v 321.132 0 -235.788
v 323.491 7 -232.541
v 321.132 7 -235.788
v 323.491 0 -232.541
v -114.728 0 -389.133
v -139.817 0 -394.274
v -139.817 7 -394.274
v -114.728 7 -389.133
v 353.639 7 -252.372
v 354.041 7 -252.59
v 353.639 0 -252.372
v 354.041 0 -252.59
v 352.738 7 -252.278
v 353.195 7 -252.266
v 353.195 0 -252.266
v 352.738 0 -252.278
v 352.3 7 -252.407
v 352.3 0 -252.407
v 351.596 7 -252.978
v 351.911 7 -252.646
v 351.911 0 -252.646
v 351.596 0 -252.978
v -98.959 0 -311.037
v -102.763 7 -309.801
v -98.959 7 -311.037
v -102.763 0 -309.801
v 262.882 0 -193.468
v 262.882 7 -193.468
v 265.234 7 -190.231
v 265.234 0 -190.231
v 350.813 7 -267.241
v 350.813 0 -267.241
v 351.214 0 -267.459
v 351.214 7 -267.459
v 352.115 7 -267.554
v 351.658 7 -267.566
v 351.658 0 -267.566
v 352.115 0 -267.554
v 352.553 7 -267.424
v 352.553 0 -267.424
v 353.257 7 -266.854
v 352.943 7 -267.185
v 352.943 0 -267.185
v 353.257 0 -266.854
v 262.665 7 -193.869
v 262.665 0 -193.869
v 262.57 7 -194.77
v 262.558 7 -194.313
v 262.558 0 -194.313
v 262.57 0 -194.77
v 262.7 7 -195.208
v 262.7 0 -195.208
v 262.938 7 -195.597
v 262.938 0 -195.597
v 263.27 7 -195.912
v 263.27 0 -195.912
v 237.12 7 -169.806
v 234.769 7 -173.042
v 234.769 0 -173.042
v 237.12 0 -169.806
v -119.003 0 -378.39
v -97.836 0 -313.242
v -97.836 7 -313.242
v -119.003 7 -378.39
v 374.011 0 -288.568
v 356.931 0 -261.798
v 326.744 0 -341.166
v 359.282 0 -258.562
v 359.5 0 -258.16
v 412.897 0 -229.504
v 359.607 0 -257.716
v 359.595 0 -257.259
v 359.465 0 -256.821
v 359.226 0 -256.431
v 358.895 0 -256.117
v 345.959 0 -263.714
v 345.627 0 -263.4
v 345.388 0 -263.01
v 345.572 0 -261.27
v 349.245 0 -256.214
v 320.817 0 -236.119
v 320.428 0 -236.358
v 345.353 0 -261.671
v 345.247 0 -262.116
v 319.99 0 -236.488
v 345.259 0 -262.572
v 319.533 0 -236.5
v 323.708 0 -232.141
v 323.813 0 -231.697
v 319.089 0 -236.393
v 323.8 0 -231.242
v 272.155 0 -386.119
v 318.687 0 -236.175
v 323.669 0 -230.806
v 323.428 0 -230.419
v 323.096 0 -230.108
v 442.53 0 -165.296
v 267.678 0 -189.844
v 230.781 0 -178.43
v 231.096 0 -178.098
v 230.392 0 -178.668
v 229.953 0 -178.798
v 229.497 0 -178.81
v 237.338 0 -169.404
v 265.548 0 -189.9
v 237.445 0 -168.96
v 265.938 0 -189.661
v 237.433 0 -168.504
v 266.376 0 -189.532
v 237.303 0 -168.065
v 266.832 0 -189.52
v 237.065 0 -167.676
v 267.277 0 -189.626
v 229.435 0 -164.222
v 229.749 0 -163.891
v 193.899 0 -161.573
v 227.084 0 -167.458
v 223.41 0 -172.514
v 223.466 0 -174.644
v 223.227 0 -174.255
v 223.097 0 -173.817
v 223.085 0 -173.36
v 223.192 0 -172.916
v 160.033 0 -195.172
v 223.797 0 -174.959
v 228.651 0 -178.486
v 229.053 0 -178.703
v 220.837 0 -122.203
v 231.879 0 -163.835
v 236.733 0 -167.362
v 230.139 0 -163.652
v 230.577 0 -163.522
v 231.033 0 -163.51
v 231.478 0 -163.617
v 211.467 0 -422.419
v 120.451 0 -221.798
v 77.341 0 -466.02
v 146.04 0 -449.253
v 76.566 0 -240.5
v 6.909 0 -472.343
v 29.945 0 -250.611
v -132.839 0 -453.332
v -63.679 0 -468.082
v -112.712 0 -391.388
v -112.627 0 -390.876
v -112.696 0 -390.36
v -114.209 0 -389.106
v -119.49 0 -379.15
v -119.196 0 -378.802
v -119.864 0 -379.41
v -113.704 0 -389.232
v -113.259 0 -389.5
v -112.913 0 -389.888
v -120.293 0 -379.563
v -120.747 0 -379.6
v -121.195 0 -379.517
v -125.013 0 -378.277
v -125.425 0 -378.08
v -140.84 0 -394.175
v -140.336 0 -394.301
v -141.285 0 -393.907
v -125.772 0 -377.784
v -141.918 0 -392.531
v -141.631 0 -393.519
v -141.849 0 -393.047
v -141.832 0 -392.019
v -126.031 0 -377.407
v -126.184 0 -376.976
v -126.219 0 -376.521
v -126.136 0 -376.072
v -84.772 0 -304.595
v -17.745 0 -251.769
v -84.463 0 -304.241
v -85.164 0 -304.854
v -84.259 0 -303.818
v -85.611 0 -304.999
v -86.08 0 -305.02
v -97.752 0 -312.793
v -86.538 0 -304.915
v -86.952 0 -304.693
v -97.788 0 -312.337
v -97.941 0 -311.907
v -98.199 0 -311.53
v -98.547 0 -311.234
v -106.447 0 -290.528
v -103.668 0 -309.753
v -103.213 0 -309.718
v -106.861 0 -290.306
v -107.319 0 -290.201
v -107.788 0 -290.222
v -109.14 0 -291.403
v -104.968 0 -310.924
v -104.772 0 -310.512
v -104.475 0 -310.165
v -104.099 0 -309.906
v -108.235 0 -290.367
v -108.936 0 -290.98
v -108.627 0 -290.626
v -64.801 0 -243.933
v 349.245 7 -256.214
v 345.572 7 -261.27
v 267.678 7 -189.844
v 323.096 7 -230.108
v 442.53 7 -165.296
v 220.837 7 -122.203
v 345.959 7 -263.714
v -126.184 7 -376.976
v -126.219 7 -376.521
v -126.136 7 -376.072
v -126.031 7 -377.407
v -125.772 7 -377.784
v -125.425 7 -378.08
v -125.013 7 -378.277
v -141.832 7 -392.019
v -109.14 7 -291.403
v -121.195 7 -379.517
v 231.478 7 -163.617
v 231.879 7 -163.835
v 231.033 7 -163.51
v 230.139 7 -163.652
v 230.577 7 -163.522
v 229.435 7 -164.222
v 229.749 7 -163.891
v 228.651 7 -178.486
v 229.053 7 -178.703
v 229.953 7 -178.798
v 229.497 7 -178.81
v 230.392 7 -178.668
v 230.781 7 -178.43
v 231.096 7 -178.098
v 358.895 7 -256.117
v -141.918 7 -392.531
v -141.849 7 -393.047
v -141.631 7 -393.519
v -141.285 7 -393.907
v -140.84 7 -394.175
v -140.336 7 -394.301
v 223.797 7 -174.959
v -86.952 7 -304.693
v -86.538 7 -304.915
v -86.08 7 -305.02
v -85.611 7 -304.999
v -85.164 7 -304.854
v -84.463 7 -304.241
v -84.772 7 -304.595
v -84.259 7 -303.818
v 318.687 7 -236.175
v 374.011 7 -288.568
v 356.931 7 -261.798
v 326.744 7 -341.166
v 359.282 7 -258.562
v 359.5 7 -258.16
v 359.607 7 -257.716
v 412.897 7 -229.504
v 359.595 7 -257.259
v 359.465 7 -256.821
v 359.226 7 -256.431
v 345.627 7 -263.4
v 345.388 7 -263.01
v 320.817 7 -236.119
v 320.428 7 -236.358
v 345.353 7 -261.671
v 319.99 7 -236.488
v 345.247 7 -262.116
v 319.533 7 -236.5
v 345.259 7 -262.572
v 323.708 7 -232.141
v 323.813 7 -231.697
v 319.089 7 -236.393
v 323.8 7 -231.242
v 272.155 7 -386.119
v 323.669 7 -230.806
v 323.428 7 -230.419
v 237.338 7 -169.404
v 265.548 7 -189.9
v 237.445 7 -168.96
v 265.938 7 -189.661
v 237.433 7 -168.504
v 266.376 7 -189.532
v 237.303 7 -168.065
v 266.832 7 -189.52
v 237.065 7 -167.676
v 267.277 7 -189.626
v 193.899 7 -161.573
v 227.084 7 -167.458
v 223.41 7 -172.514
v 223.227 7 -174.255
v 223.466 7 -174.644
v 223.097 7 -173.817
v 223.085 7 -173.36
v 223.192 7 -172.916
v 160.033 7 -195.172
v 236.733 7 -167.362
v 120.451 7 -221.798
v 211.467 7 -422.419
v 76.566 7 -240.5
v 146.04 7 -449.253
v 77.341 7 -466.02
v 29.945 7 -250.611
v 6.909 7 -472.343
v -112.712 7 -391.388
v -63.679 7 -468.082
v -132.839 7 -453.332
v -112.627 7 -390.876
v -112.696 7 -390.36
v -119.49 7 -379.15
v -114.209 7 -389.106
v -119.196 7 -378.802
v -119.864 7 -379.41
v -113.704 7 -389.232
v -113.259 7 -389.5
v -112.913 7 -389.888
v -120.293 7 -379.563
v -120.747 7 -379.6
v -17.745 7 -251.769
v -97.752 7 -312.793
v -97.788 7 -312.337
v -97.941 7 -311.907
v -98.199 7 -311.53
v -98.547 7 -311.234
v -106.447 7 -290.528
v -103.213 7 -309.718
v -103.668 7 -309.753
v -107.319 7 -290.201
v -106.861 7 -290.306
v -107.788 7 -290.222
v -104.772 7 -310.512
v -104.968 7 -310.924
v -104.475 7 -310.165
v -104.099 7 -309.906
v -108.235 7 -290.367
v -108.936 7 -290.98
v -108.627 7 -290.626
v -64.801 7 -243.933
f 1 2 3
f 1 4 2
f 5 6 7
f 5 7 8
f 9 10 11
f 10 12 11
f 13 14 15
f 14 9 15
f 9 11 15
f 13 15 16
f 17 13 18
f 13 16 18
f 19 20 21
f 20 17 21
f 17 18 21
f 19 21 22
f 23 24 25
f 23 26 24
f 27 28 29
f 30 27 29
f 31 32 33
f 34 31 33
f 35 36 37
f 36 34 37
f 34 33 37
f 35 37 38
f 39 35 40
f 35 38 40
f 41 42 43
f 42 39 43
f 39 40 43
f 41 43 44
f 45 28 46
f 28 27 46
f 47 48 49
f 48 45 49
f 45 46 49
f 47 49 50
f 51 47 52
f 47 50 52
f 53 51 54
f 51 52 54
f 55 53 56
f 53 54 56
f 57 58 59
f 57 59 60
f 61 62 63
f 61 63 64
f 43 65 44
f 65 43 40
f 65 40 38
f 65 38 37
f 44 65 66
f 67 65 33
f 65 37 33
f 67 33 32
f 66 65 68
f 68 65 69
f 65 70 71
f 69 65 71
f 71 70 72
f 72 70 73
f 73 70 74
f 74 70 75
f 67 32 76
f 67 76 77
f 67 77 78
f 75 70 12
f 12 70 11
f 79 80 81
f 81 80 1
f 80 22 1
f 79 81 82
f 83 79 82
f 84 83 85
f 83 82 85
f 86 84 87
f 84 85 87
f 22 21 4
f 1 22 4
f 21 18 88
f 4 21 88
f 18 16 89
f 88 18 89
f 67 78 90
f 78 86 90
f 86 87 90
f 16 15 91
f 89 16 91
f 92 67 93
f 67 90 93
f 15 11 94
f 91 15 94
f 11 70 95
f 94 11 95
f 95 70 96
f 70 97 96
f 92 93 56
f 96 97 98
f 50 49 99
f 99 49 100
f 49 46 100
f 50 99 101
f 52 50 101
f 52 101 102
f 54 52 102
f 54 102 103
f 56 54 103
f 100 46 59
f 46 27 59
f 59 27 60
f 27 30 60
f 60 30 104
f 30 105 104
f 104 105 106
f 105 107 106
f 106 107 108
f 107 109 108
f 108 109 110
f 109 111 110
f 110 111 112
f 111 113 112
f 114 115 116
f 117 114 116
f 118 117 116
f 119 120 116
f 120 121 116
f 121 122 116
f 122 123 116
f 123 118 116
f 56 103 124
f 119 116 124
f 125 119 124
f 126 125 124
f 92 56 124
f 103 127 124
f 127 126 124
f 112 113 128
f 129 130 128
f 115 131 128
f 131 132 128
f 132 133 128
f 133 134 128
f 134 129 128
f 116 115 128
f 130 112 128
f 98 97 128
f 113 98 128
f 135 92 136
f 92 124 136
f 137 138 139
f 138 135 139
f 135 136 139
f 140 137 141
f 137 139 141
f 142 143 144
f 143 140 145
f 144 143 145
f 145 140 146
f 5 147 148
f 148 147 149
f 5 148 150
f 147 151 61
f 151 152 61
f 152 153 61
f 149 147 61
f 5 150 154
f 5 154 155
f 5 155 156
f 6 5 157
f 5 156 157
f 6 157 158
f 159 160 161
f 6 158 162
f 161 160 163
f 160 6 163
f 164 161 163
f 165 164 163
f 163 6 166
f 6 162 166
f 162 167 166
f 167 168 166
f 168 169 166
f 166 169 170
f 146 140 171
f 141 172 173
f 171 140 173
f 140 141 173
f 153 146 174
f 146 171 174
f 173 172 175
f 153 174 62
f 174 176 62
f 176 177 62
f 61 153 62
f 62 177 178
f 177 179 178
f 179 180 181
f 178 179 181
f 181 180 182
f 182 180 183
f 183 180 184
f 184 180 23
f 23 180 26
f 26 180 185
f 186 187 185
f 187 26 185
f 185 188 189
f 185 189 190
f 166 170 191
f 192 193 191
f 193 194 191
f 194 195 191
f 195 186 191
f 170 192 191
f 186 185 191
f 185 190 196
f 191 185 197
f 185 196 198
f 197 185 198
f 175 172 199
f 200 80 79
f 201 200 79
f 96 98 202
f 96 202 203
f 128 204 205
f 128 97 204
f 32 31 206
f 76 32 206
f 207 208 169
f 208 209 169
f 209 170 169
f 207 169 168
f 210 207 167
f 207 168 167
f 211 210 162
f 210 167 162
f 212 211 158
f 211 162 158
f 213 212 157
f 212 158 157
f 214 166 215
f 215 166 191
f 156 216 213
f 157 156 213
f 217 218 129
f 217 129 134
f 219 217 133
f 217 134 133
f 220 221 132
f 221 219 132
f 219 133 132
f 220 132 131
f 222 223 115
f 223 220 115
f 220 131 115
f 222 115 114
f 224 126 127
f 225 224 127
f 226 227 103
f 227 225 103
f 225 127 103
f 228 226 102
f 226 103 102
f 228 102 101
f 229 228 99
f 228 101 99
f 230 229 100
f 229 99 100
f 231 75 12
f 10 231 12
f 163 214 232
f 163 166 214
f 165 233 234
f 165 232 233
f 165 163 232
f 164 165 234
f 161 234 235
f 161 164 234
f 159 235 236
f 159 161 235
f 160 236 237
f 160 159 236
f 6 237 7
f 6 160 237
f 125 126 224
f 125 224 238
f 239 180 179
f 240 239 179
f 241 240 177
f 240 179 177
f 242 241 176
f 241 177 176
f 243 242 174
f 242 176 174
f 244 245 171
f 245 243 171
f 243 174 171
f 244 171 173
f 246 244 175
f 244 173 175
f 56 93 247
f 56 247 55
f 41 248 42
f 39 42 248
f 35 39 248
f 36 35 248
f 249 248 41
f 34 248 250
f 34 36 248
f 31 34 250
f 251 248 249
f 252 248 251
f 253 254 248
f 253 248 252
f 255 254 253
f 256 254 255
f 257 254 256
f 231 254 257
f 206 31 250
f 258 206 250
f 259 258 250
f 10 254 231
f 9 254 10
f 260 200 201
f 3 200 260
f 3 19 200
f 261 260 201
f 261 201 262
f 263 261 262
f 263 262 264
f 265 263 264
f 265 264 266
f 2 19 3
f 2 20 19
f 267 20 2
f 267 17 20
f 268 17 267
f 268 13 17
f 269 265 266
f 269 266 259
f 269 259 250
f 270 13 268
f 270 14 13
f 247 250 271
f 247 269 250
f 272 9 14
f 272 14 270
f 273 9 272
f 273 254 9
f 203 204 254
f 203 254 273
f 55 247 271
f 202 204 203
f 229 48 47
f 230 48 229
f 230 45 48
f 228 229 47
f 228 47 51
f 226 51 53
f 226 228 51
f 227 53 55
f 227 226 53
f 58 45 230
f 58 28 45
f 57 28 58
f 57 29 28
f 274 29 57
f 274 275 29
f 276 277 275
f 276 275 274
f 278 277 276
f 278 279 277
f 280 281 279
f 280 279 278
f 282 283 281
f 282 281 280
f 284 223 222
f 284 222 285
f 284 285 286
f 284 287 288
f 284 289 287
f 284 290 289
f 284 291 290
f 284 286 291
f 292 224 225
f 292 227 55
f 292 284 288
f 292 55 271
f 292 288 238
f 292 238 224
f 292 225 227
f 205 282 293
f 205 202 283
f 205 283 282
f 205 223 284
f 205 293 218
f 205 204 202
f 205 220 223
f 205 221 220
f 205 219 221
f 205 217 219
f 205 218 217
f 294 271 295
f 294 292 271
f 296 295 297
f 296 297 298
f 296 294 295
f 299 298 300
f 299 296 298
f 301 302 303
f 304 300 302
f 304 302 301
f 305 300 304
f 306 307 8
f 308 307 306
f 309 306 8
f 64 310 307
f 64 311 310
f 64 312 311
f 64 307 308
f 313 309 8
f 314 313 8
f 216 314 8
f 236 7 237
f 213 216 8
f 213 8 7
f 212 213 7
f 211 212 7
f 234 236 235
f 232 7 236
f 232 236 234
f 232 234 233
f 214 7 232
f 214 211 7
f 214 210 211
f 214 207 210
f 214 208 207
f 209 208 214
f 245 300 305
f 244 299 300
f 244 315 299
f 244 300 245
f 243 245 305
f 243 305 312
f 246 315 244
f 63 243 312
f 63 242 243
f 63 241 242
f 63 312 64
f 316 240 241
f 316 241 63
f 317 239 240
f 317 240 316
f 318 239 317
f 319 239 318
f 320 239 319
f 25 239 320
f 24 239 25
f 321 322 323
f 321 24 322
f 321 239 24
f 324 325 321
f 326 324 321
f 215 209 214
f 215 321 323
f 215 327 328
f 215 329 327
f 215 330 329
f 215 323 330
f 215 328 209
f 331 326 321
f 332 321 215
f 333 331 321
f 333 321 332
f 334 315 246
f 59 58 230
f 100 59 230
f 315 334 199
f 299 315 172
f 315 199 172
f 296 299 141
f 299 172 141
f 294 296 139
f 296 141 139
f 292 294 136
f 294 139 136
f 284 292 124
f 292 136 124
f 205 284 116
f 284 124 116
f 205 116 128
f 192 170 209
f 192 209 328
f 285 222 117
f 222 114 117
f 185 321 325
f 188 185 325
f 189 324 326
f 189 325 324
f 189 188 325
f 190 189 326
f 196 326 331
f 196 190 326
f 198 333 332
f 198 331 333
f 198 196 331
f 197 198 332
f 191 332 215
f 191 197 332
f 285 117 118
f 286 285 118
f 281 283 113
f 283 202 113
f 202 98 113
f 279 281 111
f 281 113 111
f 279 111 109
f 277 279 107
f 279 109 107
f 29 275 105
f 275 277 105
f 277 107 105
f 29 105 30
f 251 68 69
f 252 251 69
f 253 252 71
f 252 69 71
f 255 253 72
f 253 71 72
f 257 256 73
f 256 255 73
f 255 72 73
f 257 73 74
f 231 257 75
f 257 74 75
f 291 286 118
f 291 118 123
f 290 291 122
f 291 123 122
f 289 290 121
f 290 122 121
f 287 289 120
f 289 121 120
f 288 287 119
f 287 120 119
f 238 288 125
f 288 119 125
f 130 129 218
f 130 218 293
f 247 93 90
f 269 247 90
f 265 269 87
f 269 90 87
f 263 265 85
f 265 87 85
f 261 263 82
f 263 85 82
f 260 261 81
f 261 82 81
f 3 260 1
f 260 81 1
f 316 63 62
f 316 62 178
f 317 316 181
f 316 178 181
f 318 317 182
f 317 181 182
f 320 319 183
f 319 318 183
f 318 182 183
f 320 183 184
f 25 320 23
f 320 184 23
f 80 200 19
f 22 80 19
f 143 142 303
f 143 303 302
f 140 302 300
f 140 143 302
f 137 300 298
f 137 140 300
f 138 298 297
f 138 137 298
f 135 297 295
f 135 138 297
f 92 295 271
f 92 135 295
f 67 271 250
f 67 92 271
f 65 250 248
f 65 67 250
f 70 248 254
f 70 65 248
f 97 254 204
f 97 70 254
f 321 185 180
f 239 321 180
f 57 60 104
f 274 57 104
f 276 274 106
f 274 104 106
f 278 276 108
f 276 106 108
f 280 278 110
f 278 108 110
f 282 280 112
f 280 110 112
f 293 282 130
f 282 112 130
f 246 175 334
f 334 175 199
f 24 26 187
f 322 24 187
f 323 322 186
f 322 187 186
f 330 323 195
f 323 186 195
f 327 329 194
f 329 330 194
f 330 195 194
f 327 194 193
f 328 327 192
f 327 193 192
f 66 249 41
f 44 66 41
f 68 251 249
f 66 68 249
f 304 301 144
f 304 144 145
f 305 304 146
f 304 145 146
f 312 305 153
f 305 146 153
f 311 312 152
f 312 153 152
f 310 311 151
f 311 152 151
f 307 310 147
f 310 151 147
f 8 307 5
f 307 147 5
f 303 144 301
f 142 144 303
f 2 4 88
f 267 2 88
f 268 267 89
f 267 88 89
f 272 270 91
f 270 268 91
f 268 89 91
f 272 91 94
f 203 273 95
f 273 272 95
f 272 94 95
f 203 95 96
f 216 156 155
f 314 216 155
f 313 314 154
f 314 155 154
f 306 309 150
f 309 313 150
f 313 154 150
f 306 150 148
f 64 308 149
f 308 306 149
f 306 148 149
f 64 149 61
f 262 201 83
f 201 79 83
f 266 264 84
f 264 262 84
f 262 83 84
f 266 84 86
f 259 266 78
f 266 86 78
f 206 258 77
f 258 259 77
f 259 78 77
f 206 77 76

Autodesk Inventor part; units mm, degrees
ref_plane "YZ Plane" through (0, 0, 0) normal (1, 0, 0) x (0, 1, 0)
ref_plane "XZ Plane" through (0, 0, 0) normal (0, 1, 0) x (-1, 0, 0)
ref_plane "XY Plane" through (0, 0, 0) normal (0, 0, 1) x (1, 0, 0)
sketch "Sketch1" plane through (0, 0, 0) normal (0, 1, 0) x (-1, 0, 0)
  line L0 (0, 0) -> (618.9442, 0)
  line L1 (0, 0) -> (191.2643, 588.6509)
  line L2 (0, 0) -> (-500.7364, 363.8063)
  line L3 (0, 0) -> (-500.7364, -363.8063)
  line L4 (0, 0) -> (191.2643, -588.6509)
  line L5 (396.6438, 3.75) -> (328.1438, 3.75)
  line L6 (328.1438, -3.75) -> (396.6438, -3.75)
  arc A0 (472.3938, 0) -> (145.9777, 449.2732) centre (0, 0) ccw
  arc A1 (77.994, -240.0408) -> (252.3938, 0) centre (0, 0) ccw
  line L7 (289.8938, 3.75) -> (283.8938, 3.75)
  line L8 (283.8938, -3.75) -> (289.8938, -3.75)
  arc A2 (328.1438, 3.75) -> (326.3938, 2) centre (328.1438, 2) ccw
  arc A3 (326.3938, -2) -> (328.1438, -3.75) centre (328.1438, -2) ccw
  line L9 (326.3938, 2) -> (326.3938, -2)
  arc A4 (398.3938, 2) -> (396.6438, 3.75) centre (396.6438, 2) ccw
  arc A5 (396.6438, -3.75) -> (398.3938, -2.0136) centre (396.6573, -2.0136) ccw
  line L10 (398.3938, -2.0136) -> (398.3938, 2)
  line L11 (362.3938, -3.75) -> (362.3938, 32.9806)
  arc A6 (283.8938, 3.75) -> (282.1438, 2) centre (283.8938, 2) ccw
  arc A7 (282.1438, -2) -> (283.8938, -3.75) centre (283.8938, -2) ccw
  arc A8 (289.8938, -3.75) -> (291.6438, -2) centre (289.8938, -2) ccw
  arc A9 (291.6438, 2) -> (289.8938, 3.75) centre (289.8938, 2) ccw
  line L12 (291.6438, 2) -> (291.6438, -2)
  line L13 (282.1438, -2) -> (282.1438, 2)
  line L14 (434.8938, 3.75) -> (440.8938, 3.75)
  line L15 (440.8938, -3.75) -> (434.8938, -3.75)
  arc A10 (442.6438, 2) -> (440.8938, 3.75) centre (440.8938, 2) ccw
  arc A11 (440.8938, -3.75) -> (442.6438, -2) centre (440.8938, -2) ccw
  arc A12 (433.1438, -2) -> (434.8938, -3.75) centre (434.8938, -2) ccw
  arc A13 (434.8938, 3.75) -> (433.1438, 2) centre (434.8938, 2) ccw
  line L16 (433.1438, 2) -> (433.1438, -2)
  line L17 (442.6438, -2) -> (442.6438, 2)
  line L18 (131.9467, 412.5623) -> (135.7509, 411.3262)
  arc A14 (130.8231, 414.7674) -> (131.9467, 412.5623) centre (132.4875, 414.2266) ccw
  arc A15 (135.7509, 411.3262) -> (137.956, 412.4498) centre (136.2917, 412.9905) ccw
  line L19 (139.8101, 418.1561) -> (137.956, 412.4498)
  line L20 (130.8231, 414.7674) -> (132.6772, 420.4737)
  arc A16 (134.8823, 421.5973) -> (132.6772, 420.4737) centre (134.3416, 419.9329) ccw
  line L21 (138.6866, 420.3612) -> (134.8823, 421.5973)
  arc A17 (139.8101, 418.1561) -> (138.6866, 420.3612) centre (138.1458, 418.6969) ccw
  line L22 (125.0255, 378.2728) -> (121.2083, 379.513)
  arc A18 (121.2083, 379.513) -> (119.0032, 378.3895) centre (120.6676, 377.8487) ccw
  arc A19 (126.1361, 376.0718) -> (125.0255, 378.2728) centre (124.4888, 376.6213) ccw
  line L23 (119.0032, 378.3895) -> (97.8355, 313.2421)
  line L24 (98.9591, 311.037) -> (102.7633, 309.8009)
  arc A20 (97.8355, 313.2421) -> (98.9591, 311.037) centre (99.4999, 312.7013) ccw
  arc A21 (102.7633, 309.8009) -> (104.9685, 310.9245) centre (103.3041, 311.4652) ccw
  line L25 (104.9685, 310.9245) -> (126.1361, 376.0718)
  line L26 (88.2208, 277.9878) -> (92.025, 276.7517)
  arc A22 (93.1486, 274.5466) -> (92.025, 276.7517) centre (91.4842, 275.0873) ccw
  line L27 (91.2945, 268.8402) -> (93.1486, 274.5466)
  arc A23 (88.2208, 277.9878) -> (86.0156, 276.8642) centre (87.68, 276.3234) ccw
  line L28 (86.0156, 276.8642) -> (84.1615, 271.1578)
  arc A24 (84.1615, 271.1578) -> (85.2851, 268.9527) centre (85.8259, 270.6171) ccw
  arc A25 (89.0893, 267.7166) -> (91.2945, 268.8402) centre (89.6301, 269.381) ccw
  line L29 (89.0893, 267.7166) -> (85.2851, 268.9527)
  line L30 (-351.5963, 252.9775) -> (-349.2451, 256.2136)
  arc A26 (-354.0407, 252.5903) -> (-351.5963, 252.9775) centre (-353.012, 254.0061) ccw
  arc A27 (-349.2451, 256.2136) -> (-349.6323, 258.658) centre (-350.6609, 257.2422) ccw
  line L31 (-354.4864, 262.1847) -> (-349.6323, 258.658)
  line L32 (-354.0407, 252.5903) -> (-358.8948, 256.1171)
  arc A28 (-359.2819, 258.5615) -> (-358.8948, 256.1171) centre (-357.8661, 257.5328) ccw
  line L33 (-356.9308, 261.7975) -> (-359.2819, 258.5615)
  arc A29 (-354.4864, 262.1847) -> (-356.9308, 261.7975) centre (-355.515, 260.7689) ccw
  line L34 (-321.1238, 235.799) -> (-323.4829, 232.552)
  arc A30 (-323.4829, 232.552) -> (-323.0958, 230.1076) centre (-322.0671, 231.5233) ccw
  arc A31 (-318.6874, 236.1752) -> (-321.1238, 235.799) centre (-319.7189, 234.7783) ccw
  line L35 (-323.0958, 230.1076) -> (-267.6781, 189.8443)
  line L36 (-265.2337, 190.2314) -> (-262.8825, 193.4675)
  arc A32 (-267.6781, 189.8443) -> (-265.2337, 190.2314) centre (-266.6495, 191.26) ccw
  arc A33 (-262.8825, 193.4675) -> (-263.2697, 195.9119) centre (-264.2983, 194.4961) ccw
  line L37 (-263.2697, 195.9119) -> (-318.6874, 236.1752)
  line L38 (-237.1203, 169.8059) -> (-234.7692, 173.0419)
  arc A34 (-232.3248, 173.4291) -> (-234.7692, 173.0419) centre (-233.3534, 172.0133) ccw
  line L39 (-227.4707, 169.9024) -> (-232.3248, 173.4291)
  arc A35 (-237.1203, 169.8059) -> (-236.7332, 167.3615) centre (-235.7046, 168.7773) ccw
  line L40 (-236.7332, 167.3615) -> (-231.8791, 163.8348)
  arc A36 (-231.8791, 163.8348) -> (-229.4347, 164.2219) centre (-230.8505, 165.2505) ccw
  arc A37 (-227.0835, 167.458) -> (-227.4707, 169.9024) centre (-228.4993, 168.4866) ccw
  line L41 (-227.0835, 167.458) -> (-229.4347, 164.2219)
  line L42 (-349.2451, -256.2136) -> (-351.5963, -252.9775)
  arc A38 (-349.6323, -258.658) -> (-349.2451, -256.2136) centre (-350.6609, -257.2422) ccw
  arc A39 (-351.5963, -252.9775) -> (-354.0407, -252.5903) centre (-353.012, -254.0061) ccw
  line L43 (-358.8948, -256.117) -> (-354.0407, -252.5903)
  line L44 (-349.6323, -258.658) -> (-354.4864, -262.1847)
  arc A40 (-356.9308, -261.7975) -> (-354.4864, -262.1847) centre (-355.515, -260.7689) ccw
  line L45 (-359.2819, -258.5615) -> (-356.9308, -261.7975)
  arc A41 (-358.8948, -256.117) -> (-359.2819, -258.5615) centre (-357.8661, -257.5328) ccw
  line L46 (-323.4909, -232.541) -> (-321.1318, -235.788)
  arc A42 (-321.1318, -235.788) -> (-318.6874, -236.1752) centre (-319.716, -234.7594) ccw
  arc A43 (-323.0958, -230.1076) -> (-323.4909, -232.541) centre (-322.086, -231.5203) ccw
  line L47 (-318.6874, -236.1752) -> (-263.2697, -195.9119)
  line L48 (-262.8825, -193.4675) -> (-265.2337, -190.2314)
  arc A44 (-263.2697, -195.9119) -> (-262.8825, -193.4675) centre (-264.2983, -194.4961) ccw
  arc A45 (-265.2337, -190.2314) -> (-267.6781, -189.8443) centre (-266.6495, -191.26) ccw
  line L49 (-267.6781, -189.8443) -> (-323.0958, -230.1076)
  line L50 (-234.7692, -173.0419) -> (-237.1203, -169.8059)
  arc A46 (-236.7332, -167.3615) -> (-237.1203, -169.8059) centre (-235.7046, -168.7773) ccw
  line L51 (-231.8791, -163.8348) -> (-236.7332, -167.3615)
  arc A47 (-234.7692, -173.0419) -> (-232.3248, -173.4291) centre (-233.3534, -172.0133) ccw
  line L52 (-232.3248, -173.4291) -> (-227.4707, -169.9024)
  arc A48 (-227.4707, -169.9024) -> (-227.0835, -167.458) centre (-228.4993, -168.4866) ccw
  arc A49 (-229.4347, -164.2219) -> (-231.8791, -163.8348) centre (-230.8505, -165.2505) ccw
  line L53 (-229.4347, -164.2219) -> (-227.0835, -167.458)
  line L54 (135.7509, -411.3262) -> (131.9467, -412.5623)
  arc A50 (137.956, -412.4498) -> (135.7509, -411.3262) centre (136.2917, -412.9905) ccw
  arc A51 (131.9467, -412.5623) -> (130.8231, -414.7674) centre (132.4875, -414.2266) ccw
  line L55 (132.6772, -420.4737) -> (130.8231, -414.7674)
  line L56 (137.956, -412.4498) -> (139.8101, -418.1561)
  arc A52 (138.6866, -420.3612) -> (139.8101, -418.1561) centre (138.1458, -418.6969) ccw
  line L57 (134.8823, -421.5973) -> (138.6866, -420.3612)
  arc A53 (132.6772, -420.4737) -> (134.8823, -421.5973) centre (134.3416, -419.9329) ccw
  line L58 (121.1954, -379.5172) -> (125.0126, -378.277)
  arc A54 (125.0126, -378.277) -> (126.1361, -376.0718) centre (124.4718, -376.6126) ccw
  arc A55 (119.0032, -378.3895) -> (121.1954, -379.5172) centre (120.6588, -377.8657) ccw
  line L59 (126.1361, -376.0718) -> (104.9685, -310.9245)
  line L60 (102.7633, -309.8009) -> (98.9591, -311.037)
  arc A56 (104.9685, -310.9245) -> (102.7633, -309.8009) centre (103.3041, -311.4652) ccw
  arc A57 (98.9591, -311.037) -> (97.8355, -313.2421) centre (99.4999, -312.7013) ccw
  line L61 (97.8355, -313.2421) -> (119.0032, -378.3895)
  line L62 (92.025, -276.7517) -> (88.2208, -277.9878)
  arc A58 (86.0156, -276.8642) -> (88.2208, -277.9878) centre (87.68, -276.3234) ccw
  line L63 (84.1615, -271.1578) -> (86.0156, -276.8642)
  arc A59 (92.025, -276.7517) -> (93.1486, -274.5466) centre (91.4842, -275.0873) ccw
  line L64 (93.1486, -274.5466) -> (91.2945, -268.8402)
  arc A60 (91.2945, -268.8402) -> (89.0893, -267.7166) centre (89.6301, -269.381) ccw
  arc A61 (85.2851, -268.9527) -> (84.1615, -271.1578) centre (85.8259, -270.6171) ccw
  line L65 (85.2851, -268.9527) -> (89.0893, -267.7166)
  line L66 (-442.5303, 165.2961) -> (-220.837, 122.2033)
  line L67 (-442.5303, -165.2961) -> (-220.837, -122.2033)
  arc A62 (252.3938, 0) -> (-220.837, 122.2033) centre (0, 0) ccw
  arc A63 (-220.837, -122.2033) -> (77.994, -240.0408) centre (0, 0) ccw
  arc A64 (145.9777, 449.2732) -> (-442.5303, 165.2961) centre (0, 0) ccw
  arc A65 (-442.5303, -165.2961) -> (472.3938, 0) centre (0, 0) ccw
  line L68 (115.6782, 400.5167) -> (82.9862, 299.9012)
  line L69 (84.6505, 297.6104) -> (108.7484, 297.6104)
  line L70 (110.4128, 295.3196) -> (90.9552, 235.4353)
  line L71 (138.8662, 382.8904) -> (158.9929, 444.8338)
  line L72 (118.6344, 401.1564) -> (135.91, 382.2507)
  line L73 (123.1169, 378.8929) -> (127.2722, 391.7035) construction
  line L74 (100.8612, 310.4189) -> (96.6995, 297.6104) construction
  arc A66 (135.91, 382.2507) -> (138.8662, 382.8904) centre (137.2019, 383.4311) ccw
  arc A67 (118.6344, 401.1564) -> (115.6782, 400.5167) centre (117.3425, 399.9759) ccw
  arc A68 (82.9862, 299.9012) -> (84.6505, 297.6104) centre (84.6505, 299.3604) ccw
  arc A69 (110.4128, 295.3196) -> (108.7484, 297.6104) centre (108.7484, 295.8604) ccw
  line L75 (407.0624, -13.75) -> (472.1936, -13.75)
  arc A70 (405.5405, -11.1361) -> (407.0624, -13.75) centre (407.0624, -12) ccw
  line L76 (418.1824, 11.1361) -> (405.5405, -11.1361)
  arc A71 (418.1824, 11.1361) -> (416.6605, 13.75) centre (416.6605, 12) ccw
  line L77 (416.6605, 13.75) -> (310.8671, 13.75)
  line L78 (309.2028, 11.4592) -> (316.6494, -11.4592)
  arc A72 (310.8671, 13.75) -> (309.2028, 11.4592) centre (310.8671, 12) ccw
  arc A73 (314.9851, -13.75) -> (316.6494, -11.4592) centre (314.9851, -12) ccw
  line L79 (314.9851, -13.75) -> (252.019, -13.75)
  line L80 (112.7122, -391.3883) -> (132.8388, -453.3318)
  arc A74 (114.7278, -389.1332) -> (112.7122, -391.3883) centre (114.3765, -390.8476) ccw
  line L81 (139.8166, -394.2739) -> (114.7278, -389.1332)
  arc A75 (139.8166, -394.2739) -> (141.8322, -392.0187) centre (140.1679, -392.5595) ccw
  line L82 (141.8322, -392.0187) -> (109.1403, -291.4032)
  line L83 (106.4473, -290.5282) -> (86.9517, -304.6926)
  arc A76 (109.1403, -291.4032) -> (106.4473, -290.5282) centre (107.4759, -291.944) ccw
  arc A77 (84.2587, -303.8176) -> (86.9517, -304.6926) centre (85.9231, -303.2768) ccw
  line L84 (84.2587, -303.8176) -> (64.8011, -243.9333)
  line L85 (-359.2819, 258.5615) -> (-362.9556, 253.5051)
  line L86 (-362.5684, 251.0607) -> (-357.7143, 247.534)
  line L87 (-351.5963, 252.9775) -> (-355.2699, 247.9211)
  arc A78 (-362.9556, 253.5051) -> (-362.5684, 251.0607) centre (-361.5398, 252.4765) ccw
  arc A79 (-357.7143, 247.534) -> (-355.2699, 247.9211) centre (-356.6857, 248.9498) ccw
  line L88 (-237.1203, 169.8059) -> (-240.794, 164.7495)
  line L89 (-240.4068, 162.3051) -> (-235.5527, 158.7784)
  line L90 (-229.4347, 164.2219) -> (-233.1083, 159.1656)
  arc A80 (-240.794, 164.7495) -> (-240.4068, 162.3051) centre (-239.3782, 163.7209) ccw
  arc A81 (-235.5527, 158.7784) -> (-233.1083, 159.1656) centre (-234.5241, 160.1942) ccw
  line L91 (-356.9308, -261.7975) -> (-353.2571, -266.8539)
  arc A82 (-353.2571, -266.8539) -> (-350.8127, -267.241) centre (-351.8413, -265.8253) ccw
  line L92 (-350.8127, -267.241) -> (-345.9586, -263.7143)
  arc A83 (-345.9586, -263.7143) -> (-345.5715, -261.2699) centre (-346.9872, -262.2985) ccw
  line L93 (-349.2451, -256.2136) -> (-345.5715, -261.2699)
  line L94 (-234.7692, -173.0419) -> (-231.0955, -178.0983)
  arc A84 (-231.0955, -178.0983) -> (-228.6511, -178.4855) centre (-229.6798, -177.0697) ccw
  line L95 (-228.6511, -178.4855) -> (-223.797, -174.9587)
  arc A85 (-223.797, -174.9587) -> (-223.4099, -172.5143) centre (-224.8257, -173.543) ccw
  line L96 (-227.0835, -167.458) -> (-223.4099, -172.5143)
  line L97 (138.6866, -420.3612) -> (144.6307, -418.4299)
  arc A86 (144.6307, -418.4299) -> (145.7542, -416.2247) centre (144.0899, -416.7655) ccw
  line L98 (145.7542, -416.2247) -> (143.9001, -410.5184)
  arc A87 (143.9001, -410.5184) -> (141.695, -409.3948) centre (142.2358, -411.0592) ccw
  line L99 (135.7509, -411.3262) -> (141.695, -409.3948)
  line L100 (92.025, -276.7517) -> (97.9691, -274.8203)
  arc A88 (97.9691, -274.8203) -> (99.0927, -272.6152) centre (97.4283, -273.156) ccw
  line L101 (99.0927, -272.6152) -> (97.2386, -266.9089)
  arc A89 (97.2386, -266.9089) -> (95.0334, -265.7853) centre (95.5742, -267.4496) ccw
  line L102 (89.0893, -267.7166) -> (95.0334, -265.7853)
  line L103 (442.6438, 2) -> (442.6438, 8.25)
  arc A90 (442.6438, 8.25) -> (440.8938, 10) centre (440.8938, 8.25) ccw
  line L104 (440.8938, 10) -> (434.8938, 10)
  arc A91 (434.8938, 10) -> (433.1438, 8.25) centre (434.8938, 8.25) ccw
  line L105 (433.1438, 2) -> (433.1438, 8.25)
  line L106 (291.6438, 2) -> (291.6438, 8.25)
  arc A92 (291.6438, 8.25) -> (289.8938, 10) centre (289.8938, 8.25) ccw
  line L107 (289.8938, 10) -> (283.8938, 10)
  arc A93 (283.8938, 10) -> (282.1438, 8.25) centre (283.8938, 8.25) ccw
  line L108 (282.1438, 2) -> (282.1438, 8.25)
  line L109 (134.8823, 421.5973) -> (128.9382, 423.5286)
  arc A94 (128.9382, 423.5286) -> (126.7331, 422.4051) centre (128.3975, 421.8643) ccw
  line L110 (126.7331, 422.4051) -> (124.879, 416.6987)
  arc A95 (124.879, 416.6987) -> (126.0026, 414.4936) centre (126.5434, 416.158) ccw
  line L111 (131.9467, 412.5623) -> (126.0026, 414.4936)
  line L112 (88.2208, 277.9878) -> (82.2767, 279.9191)
  arc A96 (82.2767, 279.9191) -> (80.0715, 278.7955) centre (81.7359, 278.2548) ccw
  line L113 (80.0715, 278.7955) -> (78.2174, 273.0892)
  arc A97 (78.2174, 273.0892) -> (79.341, 270.8841) centre (79.8818, 272.5484) ccw
  line L114 (85.2851, 268.9527) -> (79.341, 270.8841)
  point P0 (115.5523, 343.4982)
  point P1 (-290.9785, 216.0435)
  point P2 (-295.3869, -209.9759)
  point P3 (108.4194, -345.8158)
  point P4 (137.9375, 380.0319)
  point P5 (97.9406, 311.9068)
  point P6 (104.0986, 309.906)
  point P7 (119.8731, 379.408)
  point P8 (404.0568, -13.75)
  point P9 (411.8615, 0)
  point P10 (312.9261, 0)
  point P11 (111.7834, -388.5299)
  point P12 (127.2722, -391.7035)
  point P13 (96.6995, -297.6104)
  point P14 (282.1438, 2)
  point P15 (442.6438, 2)
  dimension "d4" = 360
  dimension "d6" = 7.5
  dimension "d7" = 7.5
  dimension "d9" = 68.5
  dimension "d10" = 7.5
  dimension "d11" = 7.5
  dimension "d12" = 3.5
  dimension "d13" = 3.5
  dimension "d19" = 360
  dimension "d21" = 25
  dimension "d25" = 10
  dimension "d26" = 10
  dimension "d27" = 1.75
  dimension "d30" = 144
  dimension "d34" = 0
  dimension "d35" = 8
  dimension "d36" = 1.75
  dimension "d43" = 8
  dimension "d44" = 1.75
  dimension "d47" = 360
extrude "Extrusion1" add sketch "Sketch1" along normal blind 7 contours A63 L84 A77 L83 L4 L60 A57 L61 A55 L58 L81 A74 L80 A65 L3 L45 L91 A82 L92 A83 L93 L42 L46 A42 L47 A44 L48 L50 L94 A84 L95 A85 L96 L53 | L3 L53 A49 L51 A46 L50 L48 A45 L49 A43 L46 L42 A39 L43 A41 L45 A65 L67 A63 | L83 A76 L82 A75 L81 L4 L58 A54 L59 A56 L60
properties part number "Level 3a - V2"
